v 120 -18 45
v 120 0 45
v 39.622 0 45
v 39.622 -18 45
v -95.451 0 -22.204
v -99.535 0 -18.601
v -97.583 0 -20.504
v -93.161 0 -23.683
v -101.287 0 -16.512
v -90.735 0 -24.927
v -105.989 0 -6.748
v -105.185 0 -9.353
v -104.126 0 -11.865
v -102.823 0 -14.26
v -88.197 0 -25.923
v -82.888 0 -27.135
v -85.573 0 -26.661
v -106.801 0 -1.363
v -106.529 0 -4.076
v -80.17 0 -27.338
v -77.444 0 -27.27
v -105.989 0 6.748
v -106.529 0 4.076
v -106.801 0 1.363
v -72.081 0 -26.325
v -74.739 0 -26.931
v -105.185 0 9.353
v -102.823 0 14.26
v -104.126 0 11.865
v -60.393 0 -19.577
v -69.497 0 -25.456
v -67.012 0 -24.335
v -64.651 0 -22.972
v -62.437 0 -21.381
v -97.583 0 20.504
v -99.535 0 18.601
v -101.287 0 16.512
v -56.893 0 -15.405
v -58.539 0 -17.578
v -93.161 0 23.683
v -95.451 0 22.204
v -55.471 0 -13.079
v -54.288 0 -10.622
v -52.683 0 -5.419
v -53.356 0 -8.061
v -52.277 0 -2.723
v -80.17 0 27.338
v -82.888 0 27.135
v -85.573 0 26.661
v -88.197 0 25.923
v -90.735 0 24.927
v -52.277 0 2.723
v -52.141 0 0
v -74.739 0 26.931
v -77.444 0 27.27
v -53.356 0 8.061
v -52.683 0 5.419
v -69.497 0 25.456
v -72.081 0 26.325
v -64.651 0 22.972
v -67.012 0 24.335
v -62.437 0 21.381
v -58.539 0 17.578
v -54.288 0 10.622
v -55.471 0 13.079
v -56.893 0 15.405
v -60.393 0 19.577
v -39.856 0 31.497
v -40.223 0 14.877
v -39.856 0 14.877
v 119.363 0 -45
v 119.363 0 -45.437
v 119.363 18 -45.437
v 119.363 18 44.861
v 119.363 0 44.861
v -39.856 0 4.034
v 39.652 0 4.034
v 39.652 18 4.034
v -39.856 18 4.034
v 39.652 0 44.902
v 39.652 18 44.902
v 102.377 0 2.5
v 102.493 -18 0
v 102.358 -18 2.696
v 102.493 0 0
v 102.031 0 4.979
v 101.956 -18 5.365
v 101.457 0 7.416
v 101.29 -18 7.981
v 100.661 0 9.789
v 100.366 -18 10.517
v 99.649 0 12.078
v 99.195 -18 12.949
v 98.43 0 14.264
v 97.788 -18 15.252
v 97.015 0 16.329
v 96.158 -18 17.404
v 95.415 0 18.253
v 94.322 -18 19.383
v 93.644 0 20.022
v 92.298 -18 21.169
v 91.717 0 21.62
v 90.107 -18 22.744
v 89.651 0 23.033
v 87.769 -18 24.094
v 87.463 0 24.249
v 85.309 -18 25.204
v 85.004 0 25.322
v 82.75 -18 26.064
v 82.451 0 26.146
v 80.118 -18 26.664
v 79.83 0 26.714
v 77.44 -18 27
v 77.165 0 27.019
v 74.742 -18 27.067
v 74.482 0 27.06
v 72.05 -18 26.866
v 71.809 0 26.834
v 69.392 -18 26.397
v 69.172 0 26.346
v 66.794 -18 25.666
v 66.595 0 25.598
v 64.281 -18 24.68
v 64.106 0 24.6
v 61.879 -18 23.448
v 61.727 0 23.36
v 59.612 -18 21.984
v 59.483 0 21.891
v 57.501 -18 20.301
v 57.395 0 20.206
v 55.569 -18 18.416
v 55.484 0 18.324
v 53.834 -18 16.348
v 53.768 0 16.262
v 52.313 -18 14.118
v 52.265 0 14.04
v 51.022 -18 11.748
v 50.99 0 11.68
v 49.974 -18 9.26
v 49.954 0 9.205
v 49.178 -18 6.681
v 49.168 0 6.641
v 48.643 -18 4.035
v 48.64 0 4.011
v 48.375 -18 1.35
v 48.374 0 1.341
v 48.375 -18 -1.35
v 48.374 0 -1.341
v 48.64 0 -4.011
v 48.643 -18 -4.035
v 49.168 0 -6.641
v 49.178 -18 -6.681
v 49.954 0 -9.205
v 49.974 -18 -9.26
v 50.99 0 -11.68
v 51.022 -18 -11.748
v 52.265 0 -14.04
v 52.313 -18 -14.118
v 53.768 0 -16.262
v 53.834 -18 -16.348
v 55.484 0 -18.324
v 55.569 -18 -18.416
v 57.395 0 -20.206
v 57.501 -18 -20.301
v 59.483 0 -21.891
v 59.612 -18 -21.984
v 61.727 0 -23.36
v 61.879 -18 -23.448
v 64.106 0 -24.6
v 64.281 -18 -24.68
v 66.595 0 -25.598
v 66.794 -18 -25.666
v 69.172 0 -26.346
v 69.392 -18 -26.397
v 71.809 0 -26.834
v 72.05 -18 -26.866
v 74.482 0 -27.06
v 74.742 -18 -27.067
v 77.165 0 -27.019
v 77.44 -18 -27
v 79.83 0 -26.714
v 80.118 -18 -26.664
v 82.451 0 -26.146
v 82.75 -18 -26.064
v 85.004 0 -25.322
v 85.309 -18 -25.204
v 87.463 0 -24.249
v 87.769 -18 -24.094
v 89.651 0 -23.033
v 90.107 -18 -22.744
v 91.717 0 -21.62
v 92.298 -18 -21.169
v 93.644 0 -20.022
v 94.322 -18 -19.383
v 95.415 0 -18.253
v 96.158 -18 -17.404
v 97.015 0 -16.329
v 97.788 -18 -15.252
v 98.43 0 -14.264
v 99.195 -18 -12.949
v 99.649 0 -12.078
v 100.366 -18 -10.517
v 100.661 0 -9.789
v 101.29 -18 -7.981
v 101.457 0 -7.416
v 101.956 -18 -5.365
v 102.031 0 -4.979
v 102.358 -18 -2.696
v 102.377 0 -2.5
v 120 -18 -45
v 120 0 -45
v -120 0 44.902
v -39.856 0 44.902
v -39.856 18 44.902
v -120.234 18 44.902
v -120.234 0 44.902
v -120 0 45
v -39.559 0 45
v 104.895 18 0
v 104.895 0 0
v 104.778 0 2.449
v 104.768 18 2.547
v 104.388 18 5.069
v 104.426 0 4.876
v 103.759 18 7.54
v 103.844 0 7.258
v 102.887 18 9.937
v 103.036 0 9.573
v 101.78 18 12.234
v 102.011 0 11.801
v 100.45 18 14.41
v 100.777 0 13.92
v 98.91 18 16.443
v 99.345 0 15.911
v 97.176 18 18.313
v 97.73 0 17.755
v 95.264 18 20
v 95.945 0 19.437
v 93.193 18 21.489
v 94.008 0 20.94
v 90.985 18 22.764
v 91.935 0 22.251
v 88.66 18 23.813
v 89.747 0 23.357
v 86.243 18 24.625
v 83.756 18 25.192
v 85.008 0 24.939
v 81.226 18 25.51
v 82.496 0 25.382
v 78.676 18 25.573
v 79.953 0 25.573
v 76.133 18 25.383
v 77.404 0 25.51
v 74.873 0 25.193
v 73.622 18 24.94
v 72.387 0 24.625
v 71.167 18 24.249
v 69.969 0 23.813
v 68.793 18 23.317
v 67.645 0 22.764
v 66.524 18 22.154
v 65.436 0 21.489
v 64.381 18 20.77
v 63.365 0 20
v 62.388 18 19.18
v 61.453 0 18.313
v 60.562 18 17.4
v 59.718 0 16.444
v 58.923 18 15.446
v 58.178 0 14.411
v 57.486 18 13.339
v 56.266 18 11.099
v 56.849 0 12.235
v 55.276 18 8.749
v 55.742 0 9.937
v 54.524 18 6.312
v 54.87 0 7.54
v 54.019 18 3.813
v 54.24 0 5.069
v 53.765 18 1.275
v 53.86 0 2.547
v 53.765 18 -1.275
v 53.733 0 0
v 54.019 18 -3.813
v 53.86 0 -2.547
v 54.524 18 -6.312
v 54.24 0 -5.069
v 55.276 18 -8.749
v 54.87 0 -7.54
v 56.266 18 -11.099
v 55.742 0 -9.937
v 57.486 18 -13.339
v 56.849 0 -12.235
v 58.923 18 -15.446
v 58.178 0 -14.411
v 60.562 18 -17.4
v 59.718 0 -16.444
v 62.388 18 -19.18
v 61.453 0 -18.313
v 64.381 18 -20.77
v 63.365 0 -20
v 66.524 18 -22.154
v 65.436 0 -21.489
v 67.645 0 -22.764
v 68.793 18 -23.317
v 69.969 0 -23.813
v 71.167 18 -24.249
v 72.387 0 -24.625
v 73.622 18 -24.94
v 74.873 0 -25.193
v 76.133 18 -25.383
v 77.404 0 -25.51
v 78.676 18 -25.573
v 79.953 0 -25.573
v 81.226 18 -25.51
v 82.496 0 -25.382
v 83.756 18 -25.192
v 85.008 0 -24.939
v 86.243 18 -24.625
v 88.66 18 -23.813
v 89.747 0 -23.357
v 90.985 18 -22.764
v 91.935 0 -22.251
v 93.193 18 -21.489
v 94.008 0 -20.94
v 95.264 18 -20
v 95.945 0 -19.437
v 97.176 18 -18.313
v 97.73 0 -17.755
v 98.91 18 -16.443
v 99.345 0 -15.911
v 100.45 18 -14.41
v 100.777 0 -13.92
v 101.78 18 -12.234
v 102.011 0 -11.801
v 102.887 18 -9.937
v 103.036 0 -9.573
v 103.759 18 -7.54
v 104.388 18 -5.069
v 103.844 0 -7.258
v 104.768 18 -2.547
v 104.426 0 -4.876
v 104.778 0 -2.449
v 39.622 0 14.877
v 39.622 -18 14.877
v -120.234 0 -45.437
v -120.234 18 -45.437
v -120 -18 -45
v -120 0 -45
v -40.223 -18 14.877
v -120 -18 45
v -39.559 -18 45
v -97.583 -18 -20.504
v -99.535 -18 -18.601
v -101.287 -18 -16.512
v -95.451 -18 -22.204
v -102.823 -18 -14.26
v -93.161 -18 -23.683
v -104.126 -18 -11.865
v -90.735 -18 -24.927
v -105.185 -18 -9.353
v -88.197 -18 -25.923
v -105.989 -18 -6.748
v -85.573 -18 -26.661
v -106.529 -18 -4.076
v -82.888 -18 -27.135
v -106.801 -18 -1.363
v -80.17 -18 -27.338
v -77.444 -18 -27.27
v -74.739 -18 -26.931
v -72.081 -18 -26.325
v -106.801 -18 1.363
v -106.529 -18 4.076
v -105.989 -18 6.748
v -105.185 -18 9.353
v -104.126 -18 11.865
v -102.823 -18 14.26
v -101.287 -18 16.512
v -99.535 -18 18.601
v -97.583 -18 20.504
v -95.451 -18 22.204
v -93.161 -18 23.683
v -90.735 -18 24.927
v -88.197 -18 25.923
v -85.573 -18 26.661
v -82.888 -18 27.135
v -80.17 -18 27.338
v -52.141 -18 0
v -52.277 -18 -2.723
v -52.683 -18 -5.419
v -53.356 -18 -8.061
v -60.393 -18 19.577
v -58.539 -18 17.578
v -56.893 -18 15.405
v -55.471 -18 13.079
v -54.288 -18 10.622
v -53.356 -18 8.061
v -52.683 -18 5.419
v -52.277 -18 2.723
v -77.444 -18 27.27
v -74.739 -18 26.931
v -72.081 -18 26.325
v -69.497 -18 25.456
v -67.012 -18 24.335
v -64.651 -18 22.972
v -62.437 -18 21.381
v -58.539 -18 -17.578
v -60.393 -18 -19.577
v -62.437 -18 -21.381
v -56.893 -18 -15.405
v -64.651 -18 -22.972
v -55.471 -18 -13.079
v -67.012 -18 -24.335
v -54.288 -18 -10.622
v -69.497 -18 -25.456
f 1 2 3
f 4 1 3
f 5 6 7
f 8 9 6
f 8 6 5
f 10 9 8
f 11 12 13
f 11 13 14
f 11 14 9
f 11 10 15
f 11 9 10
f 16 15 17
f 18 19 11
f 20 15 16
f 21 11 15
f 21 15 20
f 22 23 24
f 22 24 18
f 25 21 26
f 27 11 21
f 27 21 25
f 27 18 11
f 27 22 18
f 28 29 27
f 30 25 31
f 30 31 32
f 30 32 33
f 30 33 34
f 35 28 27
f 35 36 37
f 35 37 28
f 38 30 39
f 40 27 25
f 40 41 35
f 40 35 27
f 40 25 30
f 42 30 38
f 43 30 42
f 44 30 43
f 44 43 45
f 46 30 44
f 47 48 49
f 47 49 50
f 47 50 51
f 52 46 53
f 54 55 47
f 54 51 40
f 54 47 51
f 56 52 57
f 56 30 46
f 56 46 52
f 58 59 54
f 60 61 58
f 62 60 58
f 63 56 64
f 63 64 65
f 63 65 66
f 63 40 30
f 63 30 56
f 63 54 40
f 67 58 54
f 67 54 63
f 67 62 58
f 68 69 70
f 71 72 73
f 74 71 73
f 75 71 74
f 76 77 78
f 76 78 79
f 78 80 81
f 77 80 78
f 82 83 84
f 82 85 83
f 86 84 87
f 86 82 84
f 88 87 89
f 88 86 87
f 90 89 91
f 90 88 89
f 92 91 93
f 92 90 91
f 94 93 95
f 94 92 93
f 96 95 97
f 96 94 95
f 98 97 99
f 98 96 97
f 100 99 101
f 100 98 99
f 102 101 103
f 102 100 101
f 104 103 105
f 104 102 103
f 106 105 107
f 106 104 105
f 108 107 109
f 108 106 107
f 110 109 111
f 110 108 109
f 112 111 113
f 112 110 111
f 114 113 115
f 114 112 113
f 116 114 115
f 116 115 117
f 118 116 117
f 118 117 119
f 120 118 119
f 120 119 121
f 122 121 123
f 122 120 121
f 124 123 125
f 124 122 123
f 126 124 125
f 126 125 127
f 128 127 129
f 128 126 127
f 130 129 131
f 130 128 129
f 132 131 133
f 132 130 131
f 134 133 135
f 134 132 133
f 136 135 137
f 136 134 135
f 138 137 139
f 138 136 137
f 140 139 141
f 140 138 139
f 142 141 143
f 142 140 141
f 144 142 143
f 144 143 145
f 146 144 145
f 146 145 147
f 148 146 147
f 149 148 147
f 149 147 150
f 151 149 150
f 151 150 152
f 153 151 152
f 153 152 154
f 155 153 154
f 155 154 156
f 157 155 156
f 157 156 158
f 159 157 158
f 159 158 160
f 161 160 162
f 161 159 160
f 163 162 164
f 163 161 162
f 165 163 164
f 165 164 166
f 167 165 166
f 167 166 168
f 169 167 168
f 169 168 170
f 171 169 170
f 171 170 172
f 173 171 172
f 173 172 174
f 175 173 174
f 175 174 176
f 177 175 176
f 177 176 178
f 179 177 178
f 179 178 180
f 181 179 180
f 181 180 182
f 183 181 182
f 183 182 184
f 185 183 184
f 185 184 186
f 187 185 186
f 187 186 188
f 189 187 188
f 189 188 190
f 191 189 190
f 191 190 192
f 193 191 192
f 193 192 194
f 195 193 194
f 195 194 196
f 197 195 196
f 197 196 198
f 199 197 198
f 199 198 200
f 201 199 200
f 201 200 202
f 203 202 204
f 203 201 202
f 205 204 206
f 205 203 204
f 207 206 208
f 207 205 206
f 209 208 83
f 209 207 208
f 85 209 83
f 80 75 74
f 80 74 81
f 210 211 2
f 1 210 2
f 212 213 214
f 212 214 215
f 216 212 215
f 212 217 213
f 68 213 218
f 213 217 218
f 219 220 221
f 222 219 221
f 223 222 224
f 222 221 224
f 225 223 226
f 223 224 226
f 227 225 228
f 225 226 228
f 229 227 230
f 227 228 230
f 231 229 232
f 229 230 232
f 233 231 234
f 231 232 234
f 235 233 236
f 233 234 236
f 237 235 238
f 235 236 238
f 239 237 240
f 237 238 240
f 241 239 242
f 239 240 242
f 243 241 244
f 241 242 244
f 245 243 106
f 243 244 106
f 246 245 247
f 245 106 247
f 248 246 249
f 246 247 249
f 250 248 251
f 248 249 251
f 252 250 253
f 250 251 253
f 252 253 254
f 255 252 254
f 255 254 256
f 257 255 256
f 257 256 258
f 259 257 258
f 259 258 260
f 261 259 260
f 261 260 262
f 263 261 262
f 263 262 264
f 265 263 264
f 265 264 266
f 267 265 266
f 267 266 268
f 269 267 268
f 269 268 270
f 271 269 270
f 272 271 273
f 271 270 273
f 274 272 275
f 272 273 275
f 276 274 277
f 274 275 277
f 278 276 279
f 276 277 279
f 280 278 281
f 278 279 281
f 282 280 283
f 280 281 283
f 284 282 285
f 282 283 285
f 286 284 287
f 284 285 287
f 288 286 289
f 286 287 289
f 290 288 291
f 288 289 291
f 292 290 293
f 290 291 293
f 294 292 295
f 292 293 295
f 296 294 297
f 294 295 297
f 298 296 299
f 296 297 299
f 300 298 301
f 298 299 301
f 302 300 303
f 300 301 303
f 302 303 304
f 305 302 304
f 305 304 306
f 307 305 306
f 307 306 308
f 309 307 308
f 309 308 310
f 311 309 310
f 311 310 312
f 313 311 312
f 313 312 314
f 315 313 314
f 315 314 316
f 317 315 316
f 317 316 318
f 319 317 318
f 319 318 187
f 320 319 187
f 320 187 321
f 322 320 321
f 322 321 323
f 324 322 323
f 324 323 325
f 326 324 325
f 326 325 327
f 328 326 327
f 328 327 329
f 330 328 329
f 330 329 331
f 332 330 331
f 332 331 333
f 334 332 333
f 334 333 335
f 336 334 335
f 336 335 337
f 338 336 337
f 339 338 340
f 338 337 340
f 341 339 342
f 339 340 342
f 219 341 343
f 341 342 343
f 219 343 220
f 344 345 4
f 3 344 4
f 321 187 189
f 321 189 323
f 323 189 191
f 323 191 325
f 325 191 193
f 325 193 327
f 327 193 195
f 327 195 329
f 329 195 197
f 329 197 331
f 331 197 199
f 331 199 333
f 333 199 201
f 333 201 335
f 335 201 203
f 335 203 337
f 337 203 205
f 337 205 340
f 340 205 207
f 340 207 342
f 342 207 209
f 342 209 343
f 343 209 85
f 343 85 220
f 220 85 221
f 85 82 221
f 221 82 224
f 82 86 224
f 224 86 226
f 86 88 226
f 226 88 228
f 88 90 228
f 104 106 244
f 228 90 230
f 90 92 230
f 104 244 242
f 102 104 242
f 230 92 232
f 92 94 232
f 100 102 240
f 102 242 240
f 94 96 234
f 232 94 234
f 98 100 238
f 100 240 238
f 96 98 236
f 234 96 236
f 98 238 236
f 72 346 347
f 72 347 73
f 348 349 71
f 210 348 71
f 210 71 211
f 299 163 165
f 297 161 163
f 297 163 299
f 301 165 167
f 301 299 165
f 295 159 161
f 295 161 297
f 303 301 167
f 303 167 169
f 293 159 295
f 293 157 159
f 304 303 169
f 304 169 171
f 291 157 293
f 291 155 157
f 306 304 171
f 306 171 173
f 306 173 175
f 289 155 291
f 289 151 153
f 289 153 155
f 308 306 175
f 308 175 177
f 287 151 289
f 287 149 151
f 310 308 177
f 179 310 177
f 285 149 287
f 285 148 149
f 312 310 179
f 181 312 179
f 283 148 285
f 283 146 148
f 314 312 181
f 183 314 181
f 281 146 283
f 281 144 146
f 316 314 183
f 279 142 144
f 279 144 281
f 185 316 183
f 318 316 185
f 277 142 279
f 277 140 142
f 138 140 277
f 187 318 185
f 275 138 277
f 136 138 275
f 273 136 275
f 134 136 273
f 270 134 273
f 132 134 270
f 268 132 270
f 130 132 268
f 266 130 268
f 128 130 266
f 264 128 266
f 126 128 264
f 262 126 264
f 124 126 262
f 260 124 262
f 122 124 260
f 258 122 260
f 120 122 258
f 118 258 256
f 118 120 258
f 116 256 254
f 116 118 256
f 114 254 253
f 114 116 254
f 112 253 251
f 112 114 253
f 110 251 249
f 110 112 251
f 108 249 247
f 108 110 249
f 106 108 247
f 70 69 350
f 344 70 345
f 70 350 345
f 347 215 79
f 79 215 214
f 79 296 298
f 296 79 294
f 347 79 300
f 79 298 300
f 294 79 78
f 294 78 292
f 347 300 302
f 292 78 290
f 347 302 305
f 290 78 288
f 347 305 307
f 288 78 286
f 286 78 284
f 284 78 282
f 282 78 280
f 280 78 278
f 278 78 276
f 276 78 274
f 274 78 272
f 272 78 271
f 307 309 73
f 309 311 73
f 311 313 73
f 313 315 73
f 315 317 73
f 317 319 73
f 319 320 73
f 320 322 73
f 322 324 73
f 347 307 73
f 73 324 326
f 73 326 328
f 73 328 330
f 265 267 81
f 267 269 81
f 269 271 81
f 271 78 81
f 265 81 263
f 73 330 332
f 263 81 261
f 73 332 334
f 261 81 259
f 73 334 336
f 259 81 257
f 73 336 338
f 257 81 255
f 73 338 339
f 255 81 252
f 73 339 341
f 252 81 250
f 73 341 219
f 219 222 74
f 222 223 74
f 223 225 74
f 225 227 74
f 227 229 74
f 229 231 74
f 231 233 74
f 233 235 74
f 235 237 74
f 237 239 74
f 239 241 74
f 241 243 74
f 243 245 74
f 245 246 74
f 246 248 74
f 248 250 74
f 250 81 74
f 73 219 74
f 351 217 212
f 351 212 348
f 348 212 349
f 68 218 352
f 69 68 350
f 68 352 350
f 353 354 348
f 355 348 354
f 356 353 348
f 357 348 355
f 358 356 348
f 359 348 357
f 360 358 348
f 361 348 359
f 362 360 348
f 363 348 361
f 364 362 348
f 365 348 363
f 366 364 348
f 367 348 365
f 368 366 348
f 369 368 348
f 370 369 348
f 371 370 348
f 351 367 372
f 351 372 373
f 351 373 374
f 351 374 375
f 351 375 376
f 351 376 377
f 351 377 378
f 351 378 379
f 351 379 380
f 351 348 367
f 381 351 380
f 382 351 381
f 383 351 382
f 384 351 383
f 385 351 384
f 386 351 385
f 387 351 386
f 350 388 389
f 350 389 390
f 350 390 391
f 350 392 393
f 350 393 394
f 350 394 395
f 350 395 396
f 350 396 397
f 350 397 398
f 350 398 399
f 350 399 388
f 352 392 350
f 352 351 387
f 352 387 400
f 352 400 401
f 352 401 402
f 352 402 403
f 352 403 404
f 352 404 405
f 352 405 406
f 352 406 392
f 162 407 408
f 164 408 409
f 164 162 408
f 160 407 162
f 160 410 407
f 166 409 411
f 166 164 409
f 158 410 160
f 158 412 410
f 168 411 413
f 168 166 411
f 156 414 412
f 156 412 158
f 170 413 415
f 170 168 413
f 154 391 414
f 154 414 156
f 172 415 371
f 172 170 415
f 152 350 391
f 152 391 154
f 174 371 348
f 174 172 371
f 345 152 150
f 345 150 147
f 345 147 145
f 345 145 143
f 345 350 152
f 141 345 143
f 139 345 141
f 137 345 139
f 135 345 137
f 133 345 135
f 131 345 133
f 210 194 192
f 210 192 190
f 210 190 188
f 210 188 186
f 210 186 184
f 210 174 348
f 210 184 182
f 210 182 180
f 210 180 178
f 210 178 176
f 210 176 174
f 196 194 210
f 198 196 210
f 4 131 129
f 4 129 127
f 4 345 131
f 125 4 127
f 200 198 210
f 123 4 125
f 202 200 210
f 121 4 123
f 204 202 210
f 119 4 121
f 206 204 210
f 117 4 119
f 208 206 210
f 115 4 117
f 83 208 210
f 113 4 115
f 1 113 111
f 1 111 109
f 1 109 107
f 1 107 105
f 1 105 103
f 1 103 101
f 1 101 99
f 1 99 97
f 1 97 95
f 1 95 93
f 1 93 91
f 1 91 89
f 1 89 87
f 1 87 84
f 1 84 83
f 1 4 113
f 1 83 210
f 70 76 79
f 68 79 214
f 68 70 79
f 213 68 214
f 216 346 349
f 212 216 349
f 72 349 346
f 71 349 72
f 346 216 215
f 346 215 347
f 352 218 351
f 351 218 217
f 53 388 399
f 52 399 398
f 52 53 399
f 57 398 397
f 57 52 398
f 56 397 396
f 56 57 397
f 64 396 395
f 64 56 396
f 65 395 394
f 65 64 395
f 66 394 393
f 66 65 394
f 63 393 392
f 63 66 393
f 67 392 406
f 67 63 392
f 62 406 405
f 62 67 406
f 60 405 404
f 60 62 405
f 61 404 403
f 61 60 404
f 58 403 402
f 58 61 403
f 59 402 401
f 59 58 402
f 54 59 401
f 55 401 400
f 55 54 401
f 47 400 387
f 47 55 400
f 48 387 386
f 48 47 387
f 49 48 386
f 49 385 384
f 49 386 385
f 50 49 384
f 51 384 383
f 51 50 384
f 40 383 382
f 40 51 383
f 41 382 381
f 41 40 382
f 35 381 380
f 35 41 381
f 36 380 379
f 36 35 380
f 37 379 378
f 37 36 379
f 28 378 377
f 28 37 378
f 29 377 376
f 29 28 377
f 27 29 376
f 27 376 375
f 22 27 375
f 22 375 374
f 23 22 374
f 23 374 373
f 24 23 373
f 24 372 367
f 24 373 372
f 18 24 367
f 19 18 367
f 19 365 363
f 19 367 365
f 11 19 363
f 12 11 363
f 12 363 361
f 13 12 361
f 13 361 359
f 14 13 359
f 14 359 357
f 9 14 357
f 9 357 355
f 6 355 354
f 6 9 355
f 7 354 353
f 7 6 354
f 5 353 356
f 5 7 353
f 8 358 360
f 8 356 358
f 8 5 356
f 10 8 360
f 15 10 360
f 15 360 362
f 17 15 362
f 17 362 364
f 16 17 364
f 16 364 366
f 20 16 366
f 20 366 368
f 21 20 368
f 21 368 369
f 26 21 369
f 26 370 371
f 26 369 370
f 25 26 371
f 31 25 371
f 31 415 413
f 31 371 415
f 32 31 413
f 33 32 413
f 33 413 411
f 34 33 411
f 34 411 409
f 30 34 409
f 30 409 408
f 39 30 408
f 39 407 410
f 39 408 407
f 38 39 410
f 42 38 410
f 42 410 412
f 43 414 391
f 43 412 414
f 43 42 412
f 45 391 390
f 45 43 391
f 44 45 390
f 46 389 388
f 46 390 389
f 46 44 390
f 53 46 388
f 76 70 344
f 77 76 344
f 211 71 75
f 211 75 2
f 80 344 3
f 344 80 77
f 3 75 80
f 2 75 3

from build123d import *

# Parameters (mm, degrees)
F2_DEPTH  = 18
F0_W      = 80
F0_H      = 47.1640562918
F0_H_2    = 42.8359437082
F0_H_3    = 45
F4_DEPTH  = 25
F5_R      = 27.3467975621
F5_R_2    = 27.0757536819
F6_DEPTH  = 58.2
F8_DEPTH  = 18
F9_R      = 25.5810591855
F10_DEPTH = 63.8


# Not quite as in the source:
# - a feature names something its author has since deleted; it is built from what else it names


with BuildPart() as f2:
    # F1 (on face) → F2 (new body)
    with BuildSketch(Plane.XZ):
        Polygon((39.6220497787, 45.2090576291), (-39.5539887249, 45.2090576291), (-40.2230843902, 14.8768285289), (39.6220497787, 14.8768285289), align=None)
    extrude(amount=F2_DEPTH)


with BuildPart() as f2b:
    # F0 (on Front) → F2, piece 2 (new body)
    with BuildSketch(Plane.XZ):
        with Locations((-80, -21.4179718541)):
            Rectangle(F0_W, F0_H)
        Polygon((-40, 2.1640562918), (-40, -45), (40, -45), (40, 0), (40, 45), (-40, 45), align=None)
        with Locations((-80, 23.5820281459)):
            Rectangle(F0_W, F0_H_2)
        with Locations((80, -22.5)):
            Rectangle(F0_W, F0_H_3)
        with Locations((80, 22.5)):
            Rectangle(F0_W, F0_H_3)
    extrude(amount=F2_DEPTH)


with BuildPart() as f4_tool:
    # F3 (on face) → F4 (new body)
    with BuildSketch(Plane.XZ.offset(18)):
        Polygon((39.6220497787, 14.8768285289), (39.6220497787, 45.2090576291), (-39.5539887249, 45.2090576291), (-40.2230843902, 14.8768285289), align=None)
    extrude(amount=-F4_DEPTH)


with BuildPart() as f2_1:
    add(f2.part)

    # F4: cut by f4_tool
    add(f4_tool.part, mode=Mode.SUBTRACT)


with BuildPart() as f2b_1:
    add(f2b.part)

    # F4: cut by f4_tool
    add(f4_tool.part, mode=Mode.SUBTRACT)

    # F5 (on Front) → F6 (cut)
    with BuildSketch(Plane.XZ):
        with Locations((-79.4878825545, 0)):
            Circle(F5_R)
        with Locations((75.41680336, 0)):
            Circle(F5_R_2)
    extrude(amount=F6_DEPTH, mode=Mode.SUBTRACT)

    # F7 (on Front) → F8 (join)
    with BuildSketch(Plane.XZ):
        Polygon((119.3632781506, -45.4373732209), (119.3632781506, 44.861137867), (39.6516397595, 44.9020341039), (39.6516397595, 4.0344810113), (-39.8564524949, 4.0344810113), (-39.8564524949, 44.9020341039), (-120.2343702316, 44.9020341039), (-120.2343702316, -45.4373732209), align=None)
    extrude(amount=-F8_DEPTH)

    # F9 (on Front) → F10 (cut)
    with BuildSketch(Plane.XZ):
        with Locations((79.3142113835, 0)):
            Circle(F9_R)
    extrude(amount=-F10_DEPTH, mode=Mode.SUBTRACT)


solid = f2b_1.part
